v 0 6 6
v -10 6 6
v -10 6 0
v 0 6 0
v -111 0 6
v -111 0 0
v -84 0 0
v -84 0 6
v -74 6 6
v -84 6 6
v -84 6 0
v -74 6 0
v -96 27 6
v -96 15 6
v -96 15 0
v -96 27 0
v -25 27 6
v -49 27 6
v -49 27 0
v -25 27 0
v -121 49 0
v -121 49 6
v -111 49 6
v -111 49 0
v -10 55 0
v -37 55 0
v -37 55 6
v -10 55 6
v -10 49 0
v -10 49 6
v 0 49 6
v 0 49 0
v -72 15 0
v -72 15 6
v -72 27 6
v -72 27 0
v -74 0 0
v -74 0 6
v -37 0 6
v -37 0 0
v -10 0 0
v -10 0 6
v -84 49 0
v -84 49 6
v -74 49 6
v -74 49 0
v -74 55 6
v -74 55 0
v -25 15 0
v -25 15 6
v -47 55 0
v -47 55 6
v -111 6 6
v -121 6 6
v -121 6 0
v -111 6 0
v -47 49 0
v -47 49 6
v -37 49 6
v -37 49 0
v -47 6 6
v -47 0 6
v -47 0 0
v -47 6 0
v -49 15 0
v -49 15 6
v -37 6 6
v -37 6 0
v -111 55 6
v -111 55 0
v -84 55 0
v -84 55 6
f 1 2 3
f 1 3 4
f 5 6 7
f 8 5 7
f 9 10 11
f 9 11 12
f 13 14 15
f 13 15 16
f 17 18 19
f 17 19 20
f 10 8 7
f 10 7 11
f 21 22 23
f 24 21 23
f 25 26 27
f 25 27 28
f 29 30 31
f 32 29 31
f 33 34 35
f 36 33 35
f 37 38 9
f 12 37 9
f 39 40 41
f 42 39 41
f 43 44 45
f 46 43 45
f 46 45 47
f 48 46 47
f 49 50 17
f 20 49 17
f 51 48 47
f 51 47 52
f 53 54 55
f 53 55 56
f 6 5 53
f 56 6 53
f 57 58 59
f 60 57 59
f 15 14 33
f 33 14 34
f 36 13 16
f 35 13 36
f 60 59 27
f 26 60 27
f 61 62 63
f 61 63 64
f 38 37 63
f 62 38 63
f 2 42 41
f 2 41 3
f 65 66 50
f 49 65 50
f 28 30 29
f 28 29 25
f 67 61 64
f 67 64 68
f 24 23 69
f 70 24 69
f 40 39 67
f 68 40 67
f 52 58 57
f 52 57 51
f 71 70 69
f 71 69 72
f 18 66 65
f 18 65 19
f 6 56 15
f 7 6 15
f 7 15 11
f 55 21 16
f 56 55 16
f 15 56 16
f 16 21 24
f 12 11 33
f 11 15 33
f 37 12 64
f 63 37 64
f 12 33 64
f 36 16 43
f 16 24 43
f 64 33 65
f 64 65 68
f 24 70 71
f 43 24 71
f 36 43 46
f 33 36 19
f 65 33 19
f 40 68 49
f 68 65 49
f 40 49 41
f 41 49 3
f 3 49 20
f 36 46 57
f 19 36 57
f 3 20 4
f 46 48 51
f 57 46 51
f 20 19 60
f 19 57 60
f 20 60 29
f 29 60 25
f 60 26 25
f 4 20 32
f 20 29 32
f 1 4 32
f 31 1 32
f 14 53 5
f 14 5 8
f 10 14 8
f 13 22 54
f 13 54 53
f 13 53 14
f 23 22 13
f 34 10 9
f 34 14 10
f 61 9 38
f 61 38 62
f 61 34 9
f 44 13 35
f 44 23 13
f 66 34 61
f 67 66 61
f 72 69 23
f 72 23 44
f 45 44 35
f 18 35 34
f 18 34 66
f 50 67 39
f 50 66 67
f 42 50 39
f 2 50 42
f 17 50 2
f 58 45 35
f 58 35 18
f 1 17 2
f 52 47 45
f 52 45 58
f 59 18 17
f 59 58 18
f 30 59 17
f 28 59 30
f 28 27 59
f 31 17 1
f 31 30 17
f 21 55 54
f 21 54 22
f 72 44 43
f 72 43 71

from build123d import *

# Parameters (mm, degrees)
ESQUISSE1_W             = 121
ESQUISSE1_H             = 55
BOSS_EXTRU_1_DEPTH      = 6
ESQUISSE2_W             = 10
ESQUISSE2_H             = 6
ENL_V_MAT_ENCOCHE_DEPTH = 134.048863204
ESQUISSE3_W             = 24
ESQUISSE3_H             = 12
ENL_V_MAT_EXTRU_2_DEPTH = 6


with BuildPart() as part:
    # Esquisse1 → Boss.-Extru.1 (new body)
    with BuildSketch(Plane.XY):
        with Locations((-60.5, 27.5)):
            Rectangle(ESQUISSE1_W, ESQUISSE1_H)
    extrude(amount=BOSS_EXTRU_1_DEPTH)

    # Esquisse2 → Enlèv. mat encoche (cut, through all)
    with BuildSketch(Plane.XY.offset(6)):
        with Locations((-116, 52)):
            Rectangle(ESQUISSE2_W, ESQUISSE2_H)
        with Locations((-79, 52)):
            Rectangle(ESQUISSE2_W, ESQUISSE2_H)
        with Locations((-42, 52)):
            Rectangle(ESQUISSE2_W, ESQUISSE2_H)
        with Locations((-5, 52)):
            Rectangle(ESQUISSE2_W, ESQUISSE2_H)
        with Locations((-116, 3)):
            Rectangle(ESQUISSE2_W, ESQUISSE2_H)
        with Locations((-79, 3)):
            Rectangle(ESQUISSE2_W, ESQUISSE2_H)
        with Locations((-42, 3)):
            Rectangle(ESQUISSE2_W, ESQUISSE2_H)
        with Locations((-5, 3)):
            Rectangle(ESQUISSE2_W, ESQUISSE2_H)
    extrude(amount=-ENL_V_MAT_ENCOCHE_DEPTH, mode=Mode.SUBTRACT)

    # Esquisse3 → Enlèv. mat.-Extru.2 (cut)
    with BuildSketch(Plane.XY.offset(6)):
        with Locations((-84, 21)):
            Rectangle(ESQUISSE3_W, ESQUISSE3_H)
        with Locations((-37, 21)):
            Rectangle(ESQUISSE3_W, ESQUISSE3_H)
    extrude(amount=-ENL_V_MAT_EXTRU_2_DEPTH, mode=Mode.SUBTRACT)


solid = part.part
